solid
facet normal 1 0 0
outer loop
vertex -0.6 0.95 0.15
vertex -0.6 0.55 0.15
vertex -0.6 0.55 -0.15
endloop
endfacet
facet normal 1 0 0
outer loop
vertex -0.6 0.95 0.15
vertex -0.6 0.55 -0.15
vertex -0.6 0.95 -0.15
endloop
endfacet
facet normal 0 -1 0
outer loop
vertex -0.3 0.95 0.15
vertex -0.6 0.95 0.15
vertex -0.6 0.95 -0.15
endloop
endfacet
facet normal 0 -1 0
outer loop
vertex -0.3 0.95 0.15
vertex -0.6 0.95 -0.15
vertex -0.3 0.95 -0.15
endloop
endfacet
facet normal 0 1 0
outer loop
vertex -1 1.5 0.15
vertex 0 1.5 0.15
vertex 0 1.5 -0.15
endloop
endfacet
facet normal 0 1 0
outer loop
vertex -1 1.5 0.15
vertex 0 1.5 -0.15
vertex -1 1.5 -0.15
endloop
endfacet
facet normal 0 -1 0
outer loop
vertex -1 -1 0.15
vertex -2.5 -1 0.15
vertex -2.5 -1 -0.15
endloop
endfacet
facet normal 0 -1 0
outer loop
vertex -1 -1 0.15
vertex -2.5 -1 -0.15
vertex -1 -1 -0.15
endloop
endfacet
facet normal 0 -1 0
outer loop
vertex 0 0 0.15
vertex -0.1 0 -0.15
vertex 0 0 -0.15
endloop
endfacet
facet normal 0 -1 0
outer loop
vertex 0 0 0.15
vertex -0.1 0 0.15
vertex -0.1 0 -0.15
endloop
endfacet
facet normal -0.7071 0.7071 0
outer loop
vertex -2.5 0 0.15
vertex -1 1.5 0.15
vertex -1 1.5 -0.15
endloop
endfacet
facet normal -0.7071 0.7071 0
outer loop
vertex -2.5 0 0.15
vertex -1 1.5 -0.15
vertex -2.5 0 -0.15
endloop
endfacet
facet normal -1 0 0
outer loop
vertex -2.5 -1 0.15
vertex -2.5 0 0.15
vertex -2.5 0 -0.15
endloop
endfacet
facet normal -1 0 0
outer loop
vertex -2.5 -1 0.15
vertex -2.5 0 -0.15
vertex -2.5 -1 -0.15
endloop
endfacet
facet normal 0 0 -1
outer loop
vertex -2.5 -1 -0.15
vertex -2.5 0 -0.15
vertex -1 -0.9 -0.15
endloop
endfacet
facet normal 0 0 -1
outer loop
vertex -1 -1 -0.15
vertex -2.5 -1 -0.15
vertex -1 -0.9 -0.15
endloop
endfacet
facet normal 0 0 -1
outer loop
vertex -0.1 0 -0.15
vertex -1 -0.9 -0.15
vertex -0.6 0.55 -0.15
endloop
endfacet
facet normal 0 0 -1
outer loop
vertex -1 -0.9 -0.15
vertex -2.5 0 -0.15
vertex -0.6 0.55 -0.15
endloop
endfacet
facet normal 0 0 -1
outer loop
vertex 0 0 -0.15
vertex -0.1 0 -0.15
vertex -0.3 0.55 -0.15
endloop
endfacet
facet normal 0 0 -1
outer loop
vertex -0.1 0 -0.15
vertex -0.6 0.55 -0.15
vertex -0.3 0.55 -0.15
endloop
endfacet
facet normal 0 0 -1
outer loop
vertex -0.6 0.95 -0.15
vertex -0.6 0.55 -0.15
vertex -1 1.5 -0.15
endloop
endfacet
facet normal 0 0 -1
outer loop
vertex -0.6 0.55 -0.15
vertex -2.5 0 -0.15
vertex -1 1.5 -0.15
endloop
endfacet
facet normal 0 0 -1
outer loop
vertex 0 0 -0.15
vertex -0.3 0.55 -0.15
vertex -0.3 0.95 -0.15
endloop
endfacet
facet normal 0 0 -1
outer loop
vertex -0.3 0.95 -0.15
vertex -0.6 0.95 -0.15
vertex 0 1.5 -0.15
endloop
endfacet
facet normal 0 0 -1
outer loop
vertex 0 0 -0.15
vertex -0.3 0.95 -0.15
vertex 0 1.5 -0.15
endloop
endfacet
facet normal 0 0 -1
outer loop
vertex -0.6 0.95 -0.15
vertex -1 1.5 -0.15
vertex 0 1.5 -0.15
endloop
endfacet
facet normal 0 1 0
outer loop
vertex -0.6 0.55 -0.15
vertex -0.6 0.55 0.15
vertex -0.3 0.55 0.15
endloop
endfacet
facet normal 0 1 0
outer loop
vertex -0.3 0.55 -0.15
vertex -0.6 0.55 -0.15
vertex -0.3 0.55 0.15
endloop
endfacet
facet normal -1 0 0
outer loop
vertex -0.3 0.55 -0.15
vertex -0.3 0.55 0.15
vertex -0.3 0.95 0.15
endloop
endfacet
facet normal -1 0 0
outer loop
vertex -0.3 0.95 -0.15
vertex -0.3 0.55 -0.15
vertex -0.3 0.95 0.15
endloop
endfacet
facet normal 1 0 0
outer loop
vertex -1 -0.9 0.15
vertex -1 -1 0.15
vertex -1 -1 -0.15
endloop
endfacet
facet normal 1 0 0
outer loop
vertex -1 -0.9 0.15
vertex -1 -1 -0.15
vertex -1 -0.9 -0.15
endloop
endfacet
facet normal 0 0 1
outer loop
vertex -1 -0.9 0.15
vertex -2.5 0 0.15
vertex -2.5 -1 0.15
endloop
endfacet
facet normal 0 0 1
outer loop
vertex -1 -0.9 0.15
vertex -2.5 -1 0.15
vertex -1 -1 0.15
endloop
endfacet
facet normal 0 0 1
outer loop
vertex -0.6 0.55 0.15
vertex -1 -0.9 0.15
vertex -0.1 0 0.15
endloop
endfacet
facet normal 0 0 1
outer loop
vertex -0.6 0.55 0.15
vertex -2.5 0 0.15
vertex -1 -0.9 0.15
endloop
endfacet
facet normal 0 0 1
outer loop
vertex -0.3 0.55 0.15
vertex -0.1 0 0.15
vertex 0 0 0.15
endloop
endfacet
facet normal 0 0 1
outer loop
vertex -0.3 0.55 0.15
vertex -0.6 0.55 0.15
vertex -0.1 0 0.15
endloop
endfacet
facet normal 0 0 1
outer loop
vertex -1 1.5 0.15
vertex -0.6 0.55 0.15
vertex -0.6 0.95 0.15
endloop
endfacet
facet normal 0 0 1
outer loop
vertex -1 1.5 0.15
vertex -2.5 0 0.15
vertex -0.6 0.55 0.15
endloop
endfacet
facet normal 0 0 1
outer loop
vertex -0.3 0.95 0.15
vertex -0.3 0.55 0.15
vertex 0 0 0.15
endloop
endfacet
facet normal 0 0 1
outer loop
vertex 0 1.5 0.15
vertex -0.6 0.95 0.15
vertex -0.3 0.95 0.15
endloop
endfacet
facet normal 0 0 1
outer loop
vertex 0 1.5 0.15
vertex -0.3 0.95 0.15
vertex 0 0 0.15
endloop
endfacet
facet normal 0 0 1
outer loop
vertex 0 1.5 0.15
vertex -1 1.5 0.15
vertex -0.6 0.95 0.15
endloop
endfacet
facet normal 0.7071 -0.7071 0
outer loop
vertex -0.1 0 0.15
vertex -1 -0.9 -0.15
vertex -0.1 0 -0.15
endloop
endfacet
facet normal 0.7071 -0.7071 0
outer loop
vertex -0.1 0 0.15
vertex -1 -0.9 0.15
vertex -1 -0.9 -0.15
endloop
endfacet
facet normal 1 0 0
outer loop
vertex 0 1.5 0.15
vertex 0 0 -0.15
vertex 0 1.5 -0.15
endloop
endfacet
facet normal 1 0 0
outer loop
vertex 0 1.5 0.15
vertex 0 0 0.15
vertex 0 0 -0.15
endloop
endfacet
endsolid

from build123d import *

# Parameters (mm, degrees)
BOSS_EXTRUDE1_DEPTH = 0.15
SKETCH2_W           = 0.3
SKETCH2_H           = 0.4
CUT_EXTRUDE1_DEPTH  = 3.930870178


with BuildPart() as part:
    # Sketch1 → Boss-Extrude1 (new, symmetric)
    with BuildSketch(Plane.XY):
        Polygon((0, 0), (0, 1.5), (-1, 1.5), (-2.5, 0), (-2.5, -1), (-1, -1), (-1, -0.9), (-0.1, 0), align=None)
    extrude(amount=BOSS_EXTRUDE1_DEPTH, both=True)

    # Sketch2 → Cut-Extrude1 (cut, through all)
    with BuildSketch(Plane.XY.offset(0.15)):
        with Locations((-0.45, 0.75)):
            Rectangle(SKETCH2_W, SKETCH2_H)
    extrude(amount=-CUT_EXTRUDE1_DEPTH, mode=Mode.SUBTRACT)


solid = part.part
